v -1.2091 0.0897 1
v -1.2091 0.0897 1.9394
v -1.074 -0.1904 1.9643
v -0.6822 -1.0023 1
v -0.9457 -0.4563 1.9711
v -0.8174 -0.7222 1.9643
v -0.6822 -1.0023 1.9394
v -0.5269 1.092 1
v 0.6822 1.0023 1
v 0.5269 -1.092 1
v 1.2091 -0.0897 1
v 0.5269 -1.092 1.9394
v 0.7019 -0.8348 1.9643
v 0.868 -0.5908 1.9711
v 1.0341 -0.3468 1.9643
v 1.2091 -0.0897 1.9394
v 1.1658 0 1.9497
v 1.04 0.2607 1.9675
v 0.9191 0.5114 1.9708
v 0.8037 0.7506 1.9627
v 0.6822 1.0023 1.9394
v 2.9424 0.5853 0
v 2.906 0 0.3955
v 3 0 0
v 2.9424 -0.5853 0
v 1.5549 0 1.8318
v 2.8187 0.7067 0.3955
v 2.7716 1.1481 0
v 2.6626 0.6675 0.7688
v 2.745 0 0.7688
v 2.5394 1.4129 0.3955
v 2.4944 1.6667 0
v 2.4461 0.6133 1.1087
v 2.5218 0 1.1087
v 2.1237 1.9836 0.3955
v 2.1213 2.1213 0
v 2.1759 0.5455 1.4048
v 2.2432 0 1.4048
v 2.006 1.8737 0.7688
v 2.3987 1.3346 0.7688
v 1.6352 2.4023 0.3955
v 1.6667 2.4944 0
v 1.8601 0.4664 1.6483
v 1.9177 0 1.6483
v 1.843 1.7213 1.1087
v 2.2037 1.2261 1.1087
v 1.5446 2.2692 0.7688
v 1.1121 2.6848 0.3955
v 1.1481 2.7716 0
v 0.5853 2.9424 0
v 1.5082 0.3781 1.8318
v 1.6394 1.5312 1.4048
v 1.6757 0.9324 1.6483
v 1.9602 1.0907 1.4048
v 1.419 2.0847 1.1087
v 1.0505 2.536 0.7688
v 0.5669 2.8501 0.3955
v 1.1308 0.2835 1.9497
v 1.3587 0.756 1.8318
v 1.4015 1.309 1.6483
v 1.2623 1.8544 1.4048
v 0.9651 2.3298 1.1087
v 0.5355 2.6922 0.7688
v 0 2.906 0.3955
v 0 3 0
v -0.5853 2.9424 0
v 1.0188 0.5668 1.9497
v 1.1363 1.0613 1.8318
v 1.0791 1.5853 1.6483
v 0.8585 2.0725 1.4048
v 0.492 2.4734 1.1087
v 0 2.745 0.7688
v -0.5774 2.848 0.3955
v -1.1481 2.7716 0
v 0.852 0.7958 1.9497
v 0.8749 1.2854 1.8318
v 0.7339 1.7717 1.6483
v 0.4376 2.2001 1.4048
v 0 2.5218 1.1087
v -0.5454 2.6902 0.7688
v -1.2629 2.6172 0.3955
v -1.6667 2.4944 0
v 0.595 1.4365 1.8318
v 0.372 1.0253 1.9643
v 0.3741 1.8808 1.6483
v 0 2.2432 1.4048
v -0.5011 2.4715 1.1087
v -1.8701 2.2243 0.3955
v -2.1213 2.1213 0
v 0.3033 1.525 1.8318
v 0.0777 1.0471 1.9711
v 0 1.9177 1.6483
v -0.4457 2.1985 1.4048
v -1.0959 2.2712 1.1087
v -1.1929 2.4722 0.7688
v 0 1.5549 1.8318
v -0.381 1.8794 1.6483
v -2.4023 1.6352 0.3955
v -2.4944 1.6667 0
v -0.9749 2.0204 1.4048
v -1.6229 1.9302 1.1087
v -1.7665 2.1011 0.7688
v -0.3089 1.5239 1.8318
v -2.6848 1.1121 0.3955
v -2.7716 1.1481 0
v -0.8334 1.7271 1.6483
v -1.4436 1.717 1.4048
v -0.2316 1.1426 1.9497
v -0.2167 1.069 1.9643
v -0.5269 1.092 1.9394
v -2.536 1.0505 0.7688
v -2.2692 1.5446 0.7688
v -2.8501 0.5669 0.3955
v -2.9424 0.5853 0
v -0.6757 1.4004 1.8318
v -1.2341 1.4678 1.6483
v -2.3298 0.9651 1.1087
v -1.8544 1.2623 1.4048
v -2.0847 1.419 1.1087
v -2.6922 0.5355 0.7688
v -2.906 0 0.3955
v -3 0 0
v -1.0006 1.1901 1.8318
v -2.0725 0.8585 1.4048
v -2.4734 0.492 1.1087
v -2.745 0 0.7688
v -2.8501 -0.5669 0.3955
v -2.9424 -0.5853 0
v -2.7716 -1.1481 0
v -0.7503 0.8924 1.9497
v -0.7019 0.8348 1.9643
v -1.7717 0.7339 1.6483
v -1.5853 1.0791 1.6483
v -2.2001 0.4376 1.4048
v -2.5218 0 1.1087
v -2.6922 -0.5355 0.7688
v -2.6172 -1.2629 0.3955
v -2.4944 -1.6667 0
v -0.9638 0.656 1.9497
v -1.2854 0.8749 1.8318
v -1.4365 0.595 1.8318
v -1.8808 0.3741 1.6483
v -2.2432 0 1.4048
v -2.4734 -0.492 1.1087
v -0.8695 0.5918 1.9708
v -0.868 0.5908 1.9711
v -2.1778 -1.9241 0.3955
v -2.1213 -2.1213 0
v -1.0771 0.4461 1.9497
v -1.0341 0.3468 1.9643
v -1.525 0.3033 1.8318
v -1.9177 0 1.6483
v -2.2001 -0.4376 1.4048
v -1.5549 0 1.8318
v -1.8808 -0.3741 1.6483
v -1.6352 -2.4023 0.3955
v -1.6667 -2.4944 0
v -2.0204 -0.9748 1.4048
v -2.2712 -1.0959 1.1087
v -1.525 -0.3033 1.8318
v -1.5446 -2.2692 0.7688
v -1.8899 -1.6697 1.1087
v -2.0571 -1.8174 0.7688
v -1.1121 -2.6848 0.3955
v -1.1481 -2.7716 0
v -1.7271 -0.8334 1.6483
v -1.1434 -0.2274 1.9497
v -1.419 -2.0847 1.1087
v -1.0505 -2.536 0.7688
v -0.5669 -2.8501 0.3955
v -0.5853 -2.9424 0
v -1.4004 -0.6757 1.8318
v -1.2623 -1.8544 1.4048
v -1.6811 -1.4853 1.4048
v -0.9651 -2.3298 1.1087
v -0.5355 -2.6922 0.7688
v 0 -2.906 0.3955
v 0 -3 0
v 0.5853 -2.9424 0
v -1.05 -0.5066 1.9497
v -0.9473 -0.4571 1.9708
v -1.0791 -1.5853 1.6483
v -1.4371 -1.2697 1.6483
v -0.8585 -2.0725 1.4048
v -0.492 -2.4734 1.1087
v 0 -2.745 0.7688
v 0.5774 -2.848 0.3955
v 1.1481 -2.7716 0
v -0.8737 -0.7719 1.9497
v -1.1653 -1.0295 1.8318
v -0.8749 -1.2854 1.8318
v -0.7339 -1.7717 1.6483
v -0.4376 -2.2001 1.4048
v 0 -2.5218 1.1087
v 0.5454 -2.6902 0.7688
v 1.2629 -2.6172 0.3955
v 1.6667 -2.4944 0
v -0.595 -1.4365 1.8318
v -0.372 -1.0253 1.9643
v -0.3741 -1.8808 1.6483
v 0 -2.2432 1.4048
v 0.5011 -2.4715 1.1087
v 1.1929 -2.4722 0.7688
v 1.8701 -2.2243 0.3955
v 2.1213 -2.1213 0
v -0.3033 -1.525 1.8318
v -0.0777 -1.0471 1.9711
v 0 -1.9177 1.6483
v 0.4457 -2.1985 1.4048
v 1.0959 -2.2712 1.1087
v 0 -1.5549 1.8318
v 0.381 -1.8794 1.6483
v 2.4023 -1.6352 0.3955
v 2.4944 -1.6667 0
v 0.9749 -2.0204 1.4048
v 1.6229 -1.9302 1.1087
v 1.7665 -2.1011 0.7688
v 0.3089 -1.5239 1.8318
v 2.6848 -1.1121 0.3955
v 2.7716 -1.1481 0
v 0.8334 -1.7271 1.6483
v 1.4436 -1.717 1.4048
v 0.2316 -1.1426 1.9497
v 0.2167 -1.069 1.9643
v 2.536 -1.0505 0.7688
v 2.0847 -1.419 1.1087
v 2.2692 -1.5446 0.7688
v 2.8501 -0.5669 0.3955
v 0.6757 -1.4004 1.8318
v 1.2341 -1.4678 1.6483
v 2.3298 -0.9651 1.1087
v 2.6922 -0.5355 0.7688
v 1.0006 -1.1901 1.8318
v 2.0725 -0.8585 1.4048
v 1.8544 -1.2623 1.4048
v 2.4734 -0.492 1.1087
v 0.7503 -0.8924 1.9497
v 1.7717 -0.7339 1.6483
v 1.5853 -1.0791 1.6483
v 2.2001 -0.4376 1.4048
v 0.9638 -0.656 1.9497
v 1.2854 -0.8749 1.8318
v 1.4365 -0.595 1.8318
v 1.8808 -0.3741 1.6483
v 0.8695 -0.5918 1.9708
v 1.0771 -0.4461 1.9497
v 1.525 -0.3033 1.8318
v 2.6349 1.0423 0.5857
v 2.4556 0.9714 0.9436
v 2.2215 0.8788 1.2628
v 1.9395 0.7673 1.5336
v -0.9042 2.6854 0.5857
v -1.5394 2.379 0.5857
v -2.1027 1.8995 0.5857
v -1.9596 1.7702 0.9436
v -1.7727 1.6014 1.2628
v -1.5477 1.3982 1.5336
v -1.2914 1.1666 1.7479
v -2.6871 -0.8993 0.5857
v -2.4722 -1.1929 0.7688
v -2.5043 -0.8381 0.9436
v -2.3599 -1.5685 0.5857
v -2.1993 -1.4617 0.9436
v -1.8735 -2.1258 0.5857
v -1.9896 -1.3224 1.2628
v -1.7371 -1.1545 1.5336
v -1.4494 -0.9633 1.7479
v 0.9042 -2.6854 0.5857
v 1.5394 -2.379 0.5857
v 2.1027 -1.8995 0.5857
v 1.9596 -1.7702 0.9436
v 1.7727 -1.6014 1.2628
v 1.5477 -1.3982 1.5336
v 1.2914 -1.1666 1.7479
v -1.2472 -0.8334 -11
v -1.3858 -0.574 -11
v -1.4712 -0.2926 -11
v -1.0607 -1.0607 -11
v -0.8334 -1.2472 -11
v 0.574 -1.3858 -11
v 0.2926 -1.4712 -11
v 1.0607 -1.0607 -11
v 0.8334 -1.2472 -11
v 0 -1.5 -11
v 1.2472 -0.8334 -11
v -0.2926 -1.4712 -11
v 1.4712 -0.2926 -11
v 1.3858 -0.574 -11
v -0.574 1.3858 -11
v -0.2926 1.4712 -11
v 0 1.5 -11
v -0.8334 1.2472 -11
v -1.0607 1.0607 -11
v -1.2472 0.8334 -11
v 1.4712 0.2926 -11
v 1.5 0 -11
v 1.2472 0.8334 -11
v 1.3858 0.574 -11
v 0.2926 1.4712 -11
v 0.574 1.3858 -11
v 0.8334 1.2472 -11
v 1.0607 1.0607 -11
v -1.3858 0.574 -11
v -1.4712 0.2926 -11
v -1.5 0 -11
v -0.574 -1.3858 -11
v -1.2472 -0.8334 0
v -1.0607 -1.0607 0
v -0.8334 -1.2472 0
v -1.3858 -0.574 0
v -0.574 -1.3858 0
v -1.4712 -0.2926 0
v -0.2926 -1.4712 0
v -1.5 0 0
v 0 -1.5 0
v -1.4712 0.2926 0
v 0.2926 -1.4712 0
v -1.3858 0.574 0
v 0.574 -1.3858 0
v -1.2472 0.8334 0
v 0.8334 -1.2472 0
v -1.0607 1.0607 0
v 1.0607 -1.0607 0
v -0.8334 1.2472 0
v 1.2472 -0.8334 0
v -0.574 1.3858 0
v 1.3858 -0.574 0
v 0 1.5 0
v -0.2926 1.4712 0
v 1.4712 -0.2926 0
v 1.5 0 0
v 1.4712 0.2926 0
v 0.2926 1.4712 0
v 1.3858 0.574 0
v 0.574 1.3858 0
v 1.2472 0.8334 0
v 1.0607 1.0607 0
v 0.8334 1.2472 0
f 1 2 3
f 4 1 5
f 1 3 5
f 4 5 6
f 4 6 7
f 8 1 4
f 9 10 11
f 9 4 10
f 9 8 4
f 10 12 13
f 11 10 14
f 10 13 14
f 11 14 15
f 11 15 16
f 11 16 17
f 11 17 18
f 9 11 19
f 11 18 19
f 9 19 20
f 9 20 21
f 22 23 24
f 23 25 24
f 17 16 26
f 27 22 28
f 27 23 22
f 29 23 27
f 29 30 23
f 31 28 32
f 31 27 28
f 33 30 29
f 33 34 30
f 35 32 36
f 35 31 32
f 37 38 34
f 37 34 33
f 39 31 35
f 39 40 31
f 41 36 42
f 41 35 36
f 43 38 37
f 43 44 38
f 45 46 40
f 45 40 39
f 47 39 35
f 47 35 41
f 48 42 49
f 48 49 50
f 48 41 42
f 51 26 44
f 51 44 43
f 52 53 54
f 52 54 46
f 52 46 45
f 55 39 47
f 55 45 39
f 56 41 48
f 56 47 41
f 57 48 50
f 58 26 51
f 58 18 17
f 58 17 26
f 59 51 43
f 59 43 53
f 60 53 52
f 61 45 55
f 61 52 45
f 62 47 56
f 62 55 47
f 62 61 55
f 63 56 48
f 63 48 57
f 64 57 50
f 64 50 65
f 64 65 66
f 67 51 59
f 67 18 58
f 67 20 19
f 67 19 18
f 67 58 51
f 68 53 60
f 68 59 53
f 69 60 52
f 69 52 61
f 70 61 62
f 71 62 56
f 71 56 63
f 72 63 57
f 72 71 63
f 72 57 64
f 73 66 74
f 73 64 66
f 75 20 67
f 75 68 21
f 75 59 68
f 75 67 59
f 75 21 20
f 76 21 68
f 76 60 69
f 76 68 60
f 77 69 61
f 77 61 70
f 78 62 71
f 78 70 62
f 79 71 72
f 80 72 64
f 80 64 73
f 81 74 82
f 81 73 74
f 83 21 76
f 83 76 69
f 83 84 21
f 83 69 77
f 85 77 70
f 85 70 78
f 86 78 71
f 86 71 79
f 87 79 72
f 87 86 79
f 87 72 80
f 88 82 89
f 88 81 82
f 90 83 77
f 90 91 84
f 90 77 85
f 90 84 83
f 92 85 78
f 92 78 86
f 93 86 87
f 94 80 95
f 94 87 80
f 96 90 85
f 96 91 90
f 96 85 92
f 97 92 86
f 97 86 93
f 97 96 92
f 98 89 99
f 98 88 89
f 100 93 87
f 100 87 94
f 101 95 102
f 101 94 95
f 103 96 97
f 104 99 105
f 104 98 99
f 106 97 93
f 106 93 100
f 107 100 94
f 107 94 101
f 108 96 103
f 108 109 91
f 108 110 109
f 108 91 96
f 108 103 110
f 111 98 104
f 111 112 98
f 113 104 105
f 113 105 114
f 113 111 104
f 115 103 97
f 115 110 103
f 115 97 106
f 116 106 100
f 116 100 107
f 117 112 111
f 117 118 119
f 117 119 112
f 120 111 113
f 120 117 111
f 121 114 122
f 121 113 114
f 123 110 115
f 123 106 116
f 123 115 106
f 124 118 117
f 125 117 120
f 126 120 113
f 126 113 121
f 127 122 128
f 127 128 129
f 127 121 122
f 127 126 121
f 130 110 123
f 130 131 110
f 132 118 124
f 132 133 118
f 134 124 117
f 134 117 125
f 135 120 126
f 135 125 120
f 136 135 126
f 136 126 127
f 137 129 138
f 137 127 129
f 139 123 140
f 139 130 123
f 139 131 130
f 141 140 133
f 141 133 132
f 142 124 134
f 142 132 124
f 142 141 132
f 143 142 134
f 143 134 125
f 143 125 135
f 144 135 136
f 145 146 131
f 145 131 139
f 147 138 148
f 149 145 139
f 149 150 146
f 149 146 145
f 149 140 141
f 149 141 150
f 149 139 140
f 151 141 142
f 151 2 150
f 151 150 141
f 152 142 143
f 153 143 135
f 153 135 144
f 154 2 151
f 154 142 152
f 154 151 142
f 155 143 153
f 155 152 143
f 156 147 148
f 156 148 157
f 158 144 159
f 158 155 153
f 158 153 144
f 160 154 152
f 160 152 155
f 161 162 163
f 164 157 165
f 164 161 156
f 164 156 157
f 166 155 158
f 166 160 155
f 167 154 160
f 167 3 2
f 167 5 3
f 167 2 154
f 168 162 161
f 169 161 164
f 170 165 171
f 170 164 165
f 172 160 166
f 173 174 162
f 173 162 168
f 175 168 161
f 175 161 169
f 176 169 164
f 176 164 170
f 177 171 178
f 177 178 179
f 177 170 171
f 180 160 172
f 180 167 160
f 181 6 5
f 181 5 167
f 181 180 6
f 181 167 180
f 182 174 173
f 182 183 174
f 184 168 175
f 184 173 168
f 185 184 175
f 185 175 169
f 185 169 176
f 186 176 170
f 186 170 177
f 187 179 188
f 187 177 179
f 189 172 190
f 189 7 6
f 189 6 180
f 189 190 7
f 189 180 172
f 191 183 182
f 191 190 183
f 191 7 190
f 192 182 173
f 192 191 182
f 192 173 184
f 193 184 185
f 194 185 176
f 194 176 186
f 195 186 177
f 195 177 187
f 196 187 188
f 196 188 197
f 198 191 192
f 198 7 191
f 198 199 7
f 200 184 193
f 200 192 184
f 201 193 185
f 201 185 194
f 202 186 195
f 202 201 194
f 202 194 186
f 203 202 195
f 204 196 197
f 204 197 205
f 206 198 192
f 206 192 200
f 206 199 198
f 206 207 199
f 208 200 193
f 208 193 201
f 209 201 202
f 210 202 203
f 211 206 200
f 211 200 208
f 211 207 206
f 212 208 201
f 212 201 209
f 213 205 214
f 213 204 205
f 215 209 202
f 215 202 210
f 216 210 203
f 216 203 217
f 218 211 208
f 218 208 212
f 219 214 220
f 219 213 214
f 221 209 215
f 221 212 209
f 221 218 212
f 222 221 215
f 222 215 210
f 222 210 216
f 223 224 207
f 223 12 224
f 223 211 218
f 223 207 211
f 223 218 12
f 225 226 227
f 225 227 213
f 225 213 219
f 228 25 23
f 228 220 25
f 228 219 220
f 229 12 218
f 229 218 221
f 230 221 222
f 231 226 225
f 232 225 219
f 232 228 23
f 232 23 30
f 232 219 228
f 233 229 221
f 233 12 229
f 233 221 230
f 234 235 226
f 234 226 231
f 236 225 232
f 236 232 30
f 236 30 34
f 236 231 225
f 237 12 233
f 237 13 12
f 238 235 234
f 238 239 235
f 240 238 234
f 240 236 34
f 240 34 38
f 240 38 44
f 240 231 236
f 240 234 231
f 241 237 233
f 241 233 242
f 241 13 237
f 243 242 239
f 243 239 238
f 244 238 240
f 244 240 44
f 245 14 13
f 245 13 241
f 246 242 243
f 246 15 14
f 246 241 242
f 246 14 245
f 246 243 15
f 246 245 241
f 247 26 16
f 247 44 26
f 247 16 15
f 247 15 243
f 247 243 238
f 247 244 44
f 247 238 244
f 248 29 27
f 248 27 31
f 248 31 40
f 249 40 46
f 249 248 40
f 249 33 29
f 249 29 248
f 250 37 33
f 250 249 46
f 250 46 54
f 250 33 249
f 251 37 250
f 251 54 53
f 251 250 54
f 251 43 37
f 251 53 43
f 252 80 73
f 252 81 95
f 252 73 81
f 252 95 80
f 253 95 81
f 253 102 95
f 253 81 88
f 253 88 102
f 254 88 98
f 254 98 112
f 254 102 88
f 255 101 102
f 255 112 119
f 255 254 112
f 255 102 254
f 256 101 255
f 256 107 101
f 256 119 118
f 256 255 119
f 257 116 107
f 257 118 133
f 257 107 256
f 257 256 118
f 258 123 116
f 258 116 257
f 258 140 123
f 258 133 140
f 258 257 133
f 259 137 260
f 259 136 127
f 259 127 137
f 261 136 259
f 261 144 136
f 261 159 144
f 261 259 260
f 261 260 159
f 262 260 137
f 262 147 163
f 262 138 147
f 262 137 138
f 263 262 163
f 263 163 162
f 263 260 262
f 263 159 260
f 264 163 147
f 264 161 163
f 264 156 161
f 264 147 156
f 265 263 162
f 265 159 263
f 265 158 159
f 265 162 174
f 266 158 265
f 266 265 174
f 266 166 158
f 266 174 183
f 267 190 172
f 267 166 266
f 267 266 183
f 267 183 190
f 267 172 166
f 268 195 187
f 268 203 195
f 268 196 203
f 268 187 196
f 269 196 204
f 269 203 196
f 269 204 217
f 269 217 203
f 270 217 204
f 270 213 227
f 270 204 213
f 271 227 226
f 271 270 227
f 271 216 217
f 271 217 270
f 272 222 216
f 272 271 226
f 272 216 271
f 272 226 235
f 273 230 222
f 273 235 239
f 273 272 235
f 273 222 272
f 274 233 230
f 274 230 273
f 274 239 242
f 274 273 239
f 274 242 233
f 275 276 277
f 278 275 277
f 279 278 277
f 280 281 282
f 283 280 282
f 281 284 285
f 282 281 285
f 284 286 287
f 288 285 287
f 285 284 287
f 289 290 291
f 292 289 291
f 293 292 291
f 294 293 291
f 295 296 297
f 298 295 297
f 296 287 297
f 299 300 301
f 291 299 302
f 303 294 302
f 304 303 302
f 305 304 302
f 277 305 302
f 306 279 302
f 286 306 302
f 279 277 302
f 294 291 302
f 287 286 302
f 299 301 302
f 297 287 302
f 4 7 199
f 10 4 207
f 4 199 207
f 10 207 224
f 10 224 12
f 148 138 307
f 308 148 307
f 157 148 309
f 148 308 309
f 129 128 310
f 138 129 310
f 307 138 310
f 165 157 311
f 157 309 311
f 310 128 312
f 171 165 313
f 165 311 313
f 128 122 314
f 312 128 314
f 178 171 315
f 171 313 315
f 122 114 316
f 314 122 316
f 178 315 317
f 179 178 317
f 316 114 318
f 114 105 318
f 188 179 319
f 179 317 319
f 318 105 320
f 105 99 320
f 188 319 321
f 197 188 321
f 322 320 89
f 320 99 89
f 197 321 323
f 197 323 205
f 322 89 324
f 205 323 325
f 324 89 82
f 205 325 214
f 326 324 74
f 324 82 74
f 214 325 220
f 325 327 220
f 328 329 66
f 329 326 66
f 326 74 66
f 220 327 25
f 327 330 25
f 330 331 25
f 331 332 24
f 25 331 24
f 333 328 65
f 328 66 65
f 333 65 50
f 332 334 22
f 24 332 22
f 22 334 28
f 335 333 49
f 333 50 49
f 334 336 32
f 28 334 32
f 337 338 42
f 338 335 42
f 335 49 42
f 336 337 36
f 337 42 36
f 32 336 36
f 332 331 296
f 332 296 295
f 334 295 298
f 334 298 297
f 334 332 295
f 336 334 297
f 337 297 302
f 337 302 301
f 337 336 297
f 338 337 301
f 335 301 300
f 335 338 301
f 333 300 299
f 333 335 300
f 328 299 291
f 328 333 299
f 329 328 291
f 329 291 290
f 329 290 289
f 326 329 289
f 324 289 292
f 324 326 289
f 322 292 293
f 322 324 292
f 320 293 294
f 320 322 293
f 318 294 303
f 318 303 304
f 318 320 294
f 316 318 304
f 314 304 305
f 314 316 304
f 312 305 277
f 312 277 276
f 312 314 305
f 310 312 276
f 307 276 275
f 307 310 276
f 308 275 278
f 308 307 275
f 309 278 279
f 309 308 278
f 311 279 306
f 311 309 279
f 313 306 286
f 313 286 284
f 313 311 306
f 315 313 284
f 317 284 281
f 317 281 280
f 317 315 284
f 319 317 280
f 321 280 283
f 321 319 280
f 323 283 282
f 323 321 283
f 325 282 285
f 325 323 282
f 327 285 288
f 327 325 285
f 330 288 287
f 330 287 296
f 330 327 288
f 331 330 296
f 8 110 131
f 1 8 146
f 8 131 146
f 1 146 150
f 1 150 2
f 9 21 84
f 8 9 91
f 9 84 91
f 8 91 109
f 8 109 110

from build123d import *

# Parameters (mm, degrees)
F0_R     = 3
F0_R_2   = 1.5
F1_DEPTH = 2
F2_DEPTH = 11
F6_DEPTH = 1.5


# Not quite as in the source:
# - a fillet or chamfer that OpenCascade refuses, or shapes differently, is made with other operations: its cross-section is extruded or revolved along the edge and cut away or added


with BuildPart() as f1:
    # F0 (on Top) → F1 (new body)
    with BuildSketch(Plane.XY):
        Circle(F0_R)
        Circle(F0_R_2, mode=Mode.SUBTRACT)
        Circle(F0_R_2)
    extrude(amount=F1_DEPTH)

    # F0 (on Top) → F2 (join)
    with BuildSketch(Plane.XY):
        Circle(F0_R_2)
    extrude(amount=-F2_DEPTH)

    # F3: fillet of radius 2.3417871555 on 1 edges, made by hand

    # F3_s1 → F3_t2 (revolve, cut)
    with BuildSketch(Plane.XZ):
        with BuildLine():
            ThreePointArc((3, 0), (2.2135791593, 1.4308323542), (0.6832892667, 2))
            Line((0.6832892667, 2), (3, 2))
            Line((3, 2), (3, 0))
        make_face()
    revolve(axis=Axis((0, 0, 2), (0, 0, 1)), mode=Mode.SUBTRACT)

    # F5 (on offset) → F6 (cut)
    with BuildSketch(Plane.XY.offset(2.5)):
        Polygon((0.5268892093, -1.0919650915), (1.209114114, -0.0896831055), (0.6822249046, 1.002281986), (-0.5268892093, 1.0919650915), (-1.209114114, 0.0896831055), (-0.6822249046, -1.002281986), align=None)
    extrude(amount=-F6_DEPTH, mode=Mode.SUBTRACT)


solid = f1.part
